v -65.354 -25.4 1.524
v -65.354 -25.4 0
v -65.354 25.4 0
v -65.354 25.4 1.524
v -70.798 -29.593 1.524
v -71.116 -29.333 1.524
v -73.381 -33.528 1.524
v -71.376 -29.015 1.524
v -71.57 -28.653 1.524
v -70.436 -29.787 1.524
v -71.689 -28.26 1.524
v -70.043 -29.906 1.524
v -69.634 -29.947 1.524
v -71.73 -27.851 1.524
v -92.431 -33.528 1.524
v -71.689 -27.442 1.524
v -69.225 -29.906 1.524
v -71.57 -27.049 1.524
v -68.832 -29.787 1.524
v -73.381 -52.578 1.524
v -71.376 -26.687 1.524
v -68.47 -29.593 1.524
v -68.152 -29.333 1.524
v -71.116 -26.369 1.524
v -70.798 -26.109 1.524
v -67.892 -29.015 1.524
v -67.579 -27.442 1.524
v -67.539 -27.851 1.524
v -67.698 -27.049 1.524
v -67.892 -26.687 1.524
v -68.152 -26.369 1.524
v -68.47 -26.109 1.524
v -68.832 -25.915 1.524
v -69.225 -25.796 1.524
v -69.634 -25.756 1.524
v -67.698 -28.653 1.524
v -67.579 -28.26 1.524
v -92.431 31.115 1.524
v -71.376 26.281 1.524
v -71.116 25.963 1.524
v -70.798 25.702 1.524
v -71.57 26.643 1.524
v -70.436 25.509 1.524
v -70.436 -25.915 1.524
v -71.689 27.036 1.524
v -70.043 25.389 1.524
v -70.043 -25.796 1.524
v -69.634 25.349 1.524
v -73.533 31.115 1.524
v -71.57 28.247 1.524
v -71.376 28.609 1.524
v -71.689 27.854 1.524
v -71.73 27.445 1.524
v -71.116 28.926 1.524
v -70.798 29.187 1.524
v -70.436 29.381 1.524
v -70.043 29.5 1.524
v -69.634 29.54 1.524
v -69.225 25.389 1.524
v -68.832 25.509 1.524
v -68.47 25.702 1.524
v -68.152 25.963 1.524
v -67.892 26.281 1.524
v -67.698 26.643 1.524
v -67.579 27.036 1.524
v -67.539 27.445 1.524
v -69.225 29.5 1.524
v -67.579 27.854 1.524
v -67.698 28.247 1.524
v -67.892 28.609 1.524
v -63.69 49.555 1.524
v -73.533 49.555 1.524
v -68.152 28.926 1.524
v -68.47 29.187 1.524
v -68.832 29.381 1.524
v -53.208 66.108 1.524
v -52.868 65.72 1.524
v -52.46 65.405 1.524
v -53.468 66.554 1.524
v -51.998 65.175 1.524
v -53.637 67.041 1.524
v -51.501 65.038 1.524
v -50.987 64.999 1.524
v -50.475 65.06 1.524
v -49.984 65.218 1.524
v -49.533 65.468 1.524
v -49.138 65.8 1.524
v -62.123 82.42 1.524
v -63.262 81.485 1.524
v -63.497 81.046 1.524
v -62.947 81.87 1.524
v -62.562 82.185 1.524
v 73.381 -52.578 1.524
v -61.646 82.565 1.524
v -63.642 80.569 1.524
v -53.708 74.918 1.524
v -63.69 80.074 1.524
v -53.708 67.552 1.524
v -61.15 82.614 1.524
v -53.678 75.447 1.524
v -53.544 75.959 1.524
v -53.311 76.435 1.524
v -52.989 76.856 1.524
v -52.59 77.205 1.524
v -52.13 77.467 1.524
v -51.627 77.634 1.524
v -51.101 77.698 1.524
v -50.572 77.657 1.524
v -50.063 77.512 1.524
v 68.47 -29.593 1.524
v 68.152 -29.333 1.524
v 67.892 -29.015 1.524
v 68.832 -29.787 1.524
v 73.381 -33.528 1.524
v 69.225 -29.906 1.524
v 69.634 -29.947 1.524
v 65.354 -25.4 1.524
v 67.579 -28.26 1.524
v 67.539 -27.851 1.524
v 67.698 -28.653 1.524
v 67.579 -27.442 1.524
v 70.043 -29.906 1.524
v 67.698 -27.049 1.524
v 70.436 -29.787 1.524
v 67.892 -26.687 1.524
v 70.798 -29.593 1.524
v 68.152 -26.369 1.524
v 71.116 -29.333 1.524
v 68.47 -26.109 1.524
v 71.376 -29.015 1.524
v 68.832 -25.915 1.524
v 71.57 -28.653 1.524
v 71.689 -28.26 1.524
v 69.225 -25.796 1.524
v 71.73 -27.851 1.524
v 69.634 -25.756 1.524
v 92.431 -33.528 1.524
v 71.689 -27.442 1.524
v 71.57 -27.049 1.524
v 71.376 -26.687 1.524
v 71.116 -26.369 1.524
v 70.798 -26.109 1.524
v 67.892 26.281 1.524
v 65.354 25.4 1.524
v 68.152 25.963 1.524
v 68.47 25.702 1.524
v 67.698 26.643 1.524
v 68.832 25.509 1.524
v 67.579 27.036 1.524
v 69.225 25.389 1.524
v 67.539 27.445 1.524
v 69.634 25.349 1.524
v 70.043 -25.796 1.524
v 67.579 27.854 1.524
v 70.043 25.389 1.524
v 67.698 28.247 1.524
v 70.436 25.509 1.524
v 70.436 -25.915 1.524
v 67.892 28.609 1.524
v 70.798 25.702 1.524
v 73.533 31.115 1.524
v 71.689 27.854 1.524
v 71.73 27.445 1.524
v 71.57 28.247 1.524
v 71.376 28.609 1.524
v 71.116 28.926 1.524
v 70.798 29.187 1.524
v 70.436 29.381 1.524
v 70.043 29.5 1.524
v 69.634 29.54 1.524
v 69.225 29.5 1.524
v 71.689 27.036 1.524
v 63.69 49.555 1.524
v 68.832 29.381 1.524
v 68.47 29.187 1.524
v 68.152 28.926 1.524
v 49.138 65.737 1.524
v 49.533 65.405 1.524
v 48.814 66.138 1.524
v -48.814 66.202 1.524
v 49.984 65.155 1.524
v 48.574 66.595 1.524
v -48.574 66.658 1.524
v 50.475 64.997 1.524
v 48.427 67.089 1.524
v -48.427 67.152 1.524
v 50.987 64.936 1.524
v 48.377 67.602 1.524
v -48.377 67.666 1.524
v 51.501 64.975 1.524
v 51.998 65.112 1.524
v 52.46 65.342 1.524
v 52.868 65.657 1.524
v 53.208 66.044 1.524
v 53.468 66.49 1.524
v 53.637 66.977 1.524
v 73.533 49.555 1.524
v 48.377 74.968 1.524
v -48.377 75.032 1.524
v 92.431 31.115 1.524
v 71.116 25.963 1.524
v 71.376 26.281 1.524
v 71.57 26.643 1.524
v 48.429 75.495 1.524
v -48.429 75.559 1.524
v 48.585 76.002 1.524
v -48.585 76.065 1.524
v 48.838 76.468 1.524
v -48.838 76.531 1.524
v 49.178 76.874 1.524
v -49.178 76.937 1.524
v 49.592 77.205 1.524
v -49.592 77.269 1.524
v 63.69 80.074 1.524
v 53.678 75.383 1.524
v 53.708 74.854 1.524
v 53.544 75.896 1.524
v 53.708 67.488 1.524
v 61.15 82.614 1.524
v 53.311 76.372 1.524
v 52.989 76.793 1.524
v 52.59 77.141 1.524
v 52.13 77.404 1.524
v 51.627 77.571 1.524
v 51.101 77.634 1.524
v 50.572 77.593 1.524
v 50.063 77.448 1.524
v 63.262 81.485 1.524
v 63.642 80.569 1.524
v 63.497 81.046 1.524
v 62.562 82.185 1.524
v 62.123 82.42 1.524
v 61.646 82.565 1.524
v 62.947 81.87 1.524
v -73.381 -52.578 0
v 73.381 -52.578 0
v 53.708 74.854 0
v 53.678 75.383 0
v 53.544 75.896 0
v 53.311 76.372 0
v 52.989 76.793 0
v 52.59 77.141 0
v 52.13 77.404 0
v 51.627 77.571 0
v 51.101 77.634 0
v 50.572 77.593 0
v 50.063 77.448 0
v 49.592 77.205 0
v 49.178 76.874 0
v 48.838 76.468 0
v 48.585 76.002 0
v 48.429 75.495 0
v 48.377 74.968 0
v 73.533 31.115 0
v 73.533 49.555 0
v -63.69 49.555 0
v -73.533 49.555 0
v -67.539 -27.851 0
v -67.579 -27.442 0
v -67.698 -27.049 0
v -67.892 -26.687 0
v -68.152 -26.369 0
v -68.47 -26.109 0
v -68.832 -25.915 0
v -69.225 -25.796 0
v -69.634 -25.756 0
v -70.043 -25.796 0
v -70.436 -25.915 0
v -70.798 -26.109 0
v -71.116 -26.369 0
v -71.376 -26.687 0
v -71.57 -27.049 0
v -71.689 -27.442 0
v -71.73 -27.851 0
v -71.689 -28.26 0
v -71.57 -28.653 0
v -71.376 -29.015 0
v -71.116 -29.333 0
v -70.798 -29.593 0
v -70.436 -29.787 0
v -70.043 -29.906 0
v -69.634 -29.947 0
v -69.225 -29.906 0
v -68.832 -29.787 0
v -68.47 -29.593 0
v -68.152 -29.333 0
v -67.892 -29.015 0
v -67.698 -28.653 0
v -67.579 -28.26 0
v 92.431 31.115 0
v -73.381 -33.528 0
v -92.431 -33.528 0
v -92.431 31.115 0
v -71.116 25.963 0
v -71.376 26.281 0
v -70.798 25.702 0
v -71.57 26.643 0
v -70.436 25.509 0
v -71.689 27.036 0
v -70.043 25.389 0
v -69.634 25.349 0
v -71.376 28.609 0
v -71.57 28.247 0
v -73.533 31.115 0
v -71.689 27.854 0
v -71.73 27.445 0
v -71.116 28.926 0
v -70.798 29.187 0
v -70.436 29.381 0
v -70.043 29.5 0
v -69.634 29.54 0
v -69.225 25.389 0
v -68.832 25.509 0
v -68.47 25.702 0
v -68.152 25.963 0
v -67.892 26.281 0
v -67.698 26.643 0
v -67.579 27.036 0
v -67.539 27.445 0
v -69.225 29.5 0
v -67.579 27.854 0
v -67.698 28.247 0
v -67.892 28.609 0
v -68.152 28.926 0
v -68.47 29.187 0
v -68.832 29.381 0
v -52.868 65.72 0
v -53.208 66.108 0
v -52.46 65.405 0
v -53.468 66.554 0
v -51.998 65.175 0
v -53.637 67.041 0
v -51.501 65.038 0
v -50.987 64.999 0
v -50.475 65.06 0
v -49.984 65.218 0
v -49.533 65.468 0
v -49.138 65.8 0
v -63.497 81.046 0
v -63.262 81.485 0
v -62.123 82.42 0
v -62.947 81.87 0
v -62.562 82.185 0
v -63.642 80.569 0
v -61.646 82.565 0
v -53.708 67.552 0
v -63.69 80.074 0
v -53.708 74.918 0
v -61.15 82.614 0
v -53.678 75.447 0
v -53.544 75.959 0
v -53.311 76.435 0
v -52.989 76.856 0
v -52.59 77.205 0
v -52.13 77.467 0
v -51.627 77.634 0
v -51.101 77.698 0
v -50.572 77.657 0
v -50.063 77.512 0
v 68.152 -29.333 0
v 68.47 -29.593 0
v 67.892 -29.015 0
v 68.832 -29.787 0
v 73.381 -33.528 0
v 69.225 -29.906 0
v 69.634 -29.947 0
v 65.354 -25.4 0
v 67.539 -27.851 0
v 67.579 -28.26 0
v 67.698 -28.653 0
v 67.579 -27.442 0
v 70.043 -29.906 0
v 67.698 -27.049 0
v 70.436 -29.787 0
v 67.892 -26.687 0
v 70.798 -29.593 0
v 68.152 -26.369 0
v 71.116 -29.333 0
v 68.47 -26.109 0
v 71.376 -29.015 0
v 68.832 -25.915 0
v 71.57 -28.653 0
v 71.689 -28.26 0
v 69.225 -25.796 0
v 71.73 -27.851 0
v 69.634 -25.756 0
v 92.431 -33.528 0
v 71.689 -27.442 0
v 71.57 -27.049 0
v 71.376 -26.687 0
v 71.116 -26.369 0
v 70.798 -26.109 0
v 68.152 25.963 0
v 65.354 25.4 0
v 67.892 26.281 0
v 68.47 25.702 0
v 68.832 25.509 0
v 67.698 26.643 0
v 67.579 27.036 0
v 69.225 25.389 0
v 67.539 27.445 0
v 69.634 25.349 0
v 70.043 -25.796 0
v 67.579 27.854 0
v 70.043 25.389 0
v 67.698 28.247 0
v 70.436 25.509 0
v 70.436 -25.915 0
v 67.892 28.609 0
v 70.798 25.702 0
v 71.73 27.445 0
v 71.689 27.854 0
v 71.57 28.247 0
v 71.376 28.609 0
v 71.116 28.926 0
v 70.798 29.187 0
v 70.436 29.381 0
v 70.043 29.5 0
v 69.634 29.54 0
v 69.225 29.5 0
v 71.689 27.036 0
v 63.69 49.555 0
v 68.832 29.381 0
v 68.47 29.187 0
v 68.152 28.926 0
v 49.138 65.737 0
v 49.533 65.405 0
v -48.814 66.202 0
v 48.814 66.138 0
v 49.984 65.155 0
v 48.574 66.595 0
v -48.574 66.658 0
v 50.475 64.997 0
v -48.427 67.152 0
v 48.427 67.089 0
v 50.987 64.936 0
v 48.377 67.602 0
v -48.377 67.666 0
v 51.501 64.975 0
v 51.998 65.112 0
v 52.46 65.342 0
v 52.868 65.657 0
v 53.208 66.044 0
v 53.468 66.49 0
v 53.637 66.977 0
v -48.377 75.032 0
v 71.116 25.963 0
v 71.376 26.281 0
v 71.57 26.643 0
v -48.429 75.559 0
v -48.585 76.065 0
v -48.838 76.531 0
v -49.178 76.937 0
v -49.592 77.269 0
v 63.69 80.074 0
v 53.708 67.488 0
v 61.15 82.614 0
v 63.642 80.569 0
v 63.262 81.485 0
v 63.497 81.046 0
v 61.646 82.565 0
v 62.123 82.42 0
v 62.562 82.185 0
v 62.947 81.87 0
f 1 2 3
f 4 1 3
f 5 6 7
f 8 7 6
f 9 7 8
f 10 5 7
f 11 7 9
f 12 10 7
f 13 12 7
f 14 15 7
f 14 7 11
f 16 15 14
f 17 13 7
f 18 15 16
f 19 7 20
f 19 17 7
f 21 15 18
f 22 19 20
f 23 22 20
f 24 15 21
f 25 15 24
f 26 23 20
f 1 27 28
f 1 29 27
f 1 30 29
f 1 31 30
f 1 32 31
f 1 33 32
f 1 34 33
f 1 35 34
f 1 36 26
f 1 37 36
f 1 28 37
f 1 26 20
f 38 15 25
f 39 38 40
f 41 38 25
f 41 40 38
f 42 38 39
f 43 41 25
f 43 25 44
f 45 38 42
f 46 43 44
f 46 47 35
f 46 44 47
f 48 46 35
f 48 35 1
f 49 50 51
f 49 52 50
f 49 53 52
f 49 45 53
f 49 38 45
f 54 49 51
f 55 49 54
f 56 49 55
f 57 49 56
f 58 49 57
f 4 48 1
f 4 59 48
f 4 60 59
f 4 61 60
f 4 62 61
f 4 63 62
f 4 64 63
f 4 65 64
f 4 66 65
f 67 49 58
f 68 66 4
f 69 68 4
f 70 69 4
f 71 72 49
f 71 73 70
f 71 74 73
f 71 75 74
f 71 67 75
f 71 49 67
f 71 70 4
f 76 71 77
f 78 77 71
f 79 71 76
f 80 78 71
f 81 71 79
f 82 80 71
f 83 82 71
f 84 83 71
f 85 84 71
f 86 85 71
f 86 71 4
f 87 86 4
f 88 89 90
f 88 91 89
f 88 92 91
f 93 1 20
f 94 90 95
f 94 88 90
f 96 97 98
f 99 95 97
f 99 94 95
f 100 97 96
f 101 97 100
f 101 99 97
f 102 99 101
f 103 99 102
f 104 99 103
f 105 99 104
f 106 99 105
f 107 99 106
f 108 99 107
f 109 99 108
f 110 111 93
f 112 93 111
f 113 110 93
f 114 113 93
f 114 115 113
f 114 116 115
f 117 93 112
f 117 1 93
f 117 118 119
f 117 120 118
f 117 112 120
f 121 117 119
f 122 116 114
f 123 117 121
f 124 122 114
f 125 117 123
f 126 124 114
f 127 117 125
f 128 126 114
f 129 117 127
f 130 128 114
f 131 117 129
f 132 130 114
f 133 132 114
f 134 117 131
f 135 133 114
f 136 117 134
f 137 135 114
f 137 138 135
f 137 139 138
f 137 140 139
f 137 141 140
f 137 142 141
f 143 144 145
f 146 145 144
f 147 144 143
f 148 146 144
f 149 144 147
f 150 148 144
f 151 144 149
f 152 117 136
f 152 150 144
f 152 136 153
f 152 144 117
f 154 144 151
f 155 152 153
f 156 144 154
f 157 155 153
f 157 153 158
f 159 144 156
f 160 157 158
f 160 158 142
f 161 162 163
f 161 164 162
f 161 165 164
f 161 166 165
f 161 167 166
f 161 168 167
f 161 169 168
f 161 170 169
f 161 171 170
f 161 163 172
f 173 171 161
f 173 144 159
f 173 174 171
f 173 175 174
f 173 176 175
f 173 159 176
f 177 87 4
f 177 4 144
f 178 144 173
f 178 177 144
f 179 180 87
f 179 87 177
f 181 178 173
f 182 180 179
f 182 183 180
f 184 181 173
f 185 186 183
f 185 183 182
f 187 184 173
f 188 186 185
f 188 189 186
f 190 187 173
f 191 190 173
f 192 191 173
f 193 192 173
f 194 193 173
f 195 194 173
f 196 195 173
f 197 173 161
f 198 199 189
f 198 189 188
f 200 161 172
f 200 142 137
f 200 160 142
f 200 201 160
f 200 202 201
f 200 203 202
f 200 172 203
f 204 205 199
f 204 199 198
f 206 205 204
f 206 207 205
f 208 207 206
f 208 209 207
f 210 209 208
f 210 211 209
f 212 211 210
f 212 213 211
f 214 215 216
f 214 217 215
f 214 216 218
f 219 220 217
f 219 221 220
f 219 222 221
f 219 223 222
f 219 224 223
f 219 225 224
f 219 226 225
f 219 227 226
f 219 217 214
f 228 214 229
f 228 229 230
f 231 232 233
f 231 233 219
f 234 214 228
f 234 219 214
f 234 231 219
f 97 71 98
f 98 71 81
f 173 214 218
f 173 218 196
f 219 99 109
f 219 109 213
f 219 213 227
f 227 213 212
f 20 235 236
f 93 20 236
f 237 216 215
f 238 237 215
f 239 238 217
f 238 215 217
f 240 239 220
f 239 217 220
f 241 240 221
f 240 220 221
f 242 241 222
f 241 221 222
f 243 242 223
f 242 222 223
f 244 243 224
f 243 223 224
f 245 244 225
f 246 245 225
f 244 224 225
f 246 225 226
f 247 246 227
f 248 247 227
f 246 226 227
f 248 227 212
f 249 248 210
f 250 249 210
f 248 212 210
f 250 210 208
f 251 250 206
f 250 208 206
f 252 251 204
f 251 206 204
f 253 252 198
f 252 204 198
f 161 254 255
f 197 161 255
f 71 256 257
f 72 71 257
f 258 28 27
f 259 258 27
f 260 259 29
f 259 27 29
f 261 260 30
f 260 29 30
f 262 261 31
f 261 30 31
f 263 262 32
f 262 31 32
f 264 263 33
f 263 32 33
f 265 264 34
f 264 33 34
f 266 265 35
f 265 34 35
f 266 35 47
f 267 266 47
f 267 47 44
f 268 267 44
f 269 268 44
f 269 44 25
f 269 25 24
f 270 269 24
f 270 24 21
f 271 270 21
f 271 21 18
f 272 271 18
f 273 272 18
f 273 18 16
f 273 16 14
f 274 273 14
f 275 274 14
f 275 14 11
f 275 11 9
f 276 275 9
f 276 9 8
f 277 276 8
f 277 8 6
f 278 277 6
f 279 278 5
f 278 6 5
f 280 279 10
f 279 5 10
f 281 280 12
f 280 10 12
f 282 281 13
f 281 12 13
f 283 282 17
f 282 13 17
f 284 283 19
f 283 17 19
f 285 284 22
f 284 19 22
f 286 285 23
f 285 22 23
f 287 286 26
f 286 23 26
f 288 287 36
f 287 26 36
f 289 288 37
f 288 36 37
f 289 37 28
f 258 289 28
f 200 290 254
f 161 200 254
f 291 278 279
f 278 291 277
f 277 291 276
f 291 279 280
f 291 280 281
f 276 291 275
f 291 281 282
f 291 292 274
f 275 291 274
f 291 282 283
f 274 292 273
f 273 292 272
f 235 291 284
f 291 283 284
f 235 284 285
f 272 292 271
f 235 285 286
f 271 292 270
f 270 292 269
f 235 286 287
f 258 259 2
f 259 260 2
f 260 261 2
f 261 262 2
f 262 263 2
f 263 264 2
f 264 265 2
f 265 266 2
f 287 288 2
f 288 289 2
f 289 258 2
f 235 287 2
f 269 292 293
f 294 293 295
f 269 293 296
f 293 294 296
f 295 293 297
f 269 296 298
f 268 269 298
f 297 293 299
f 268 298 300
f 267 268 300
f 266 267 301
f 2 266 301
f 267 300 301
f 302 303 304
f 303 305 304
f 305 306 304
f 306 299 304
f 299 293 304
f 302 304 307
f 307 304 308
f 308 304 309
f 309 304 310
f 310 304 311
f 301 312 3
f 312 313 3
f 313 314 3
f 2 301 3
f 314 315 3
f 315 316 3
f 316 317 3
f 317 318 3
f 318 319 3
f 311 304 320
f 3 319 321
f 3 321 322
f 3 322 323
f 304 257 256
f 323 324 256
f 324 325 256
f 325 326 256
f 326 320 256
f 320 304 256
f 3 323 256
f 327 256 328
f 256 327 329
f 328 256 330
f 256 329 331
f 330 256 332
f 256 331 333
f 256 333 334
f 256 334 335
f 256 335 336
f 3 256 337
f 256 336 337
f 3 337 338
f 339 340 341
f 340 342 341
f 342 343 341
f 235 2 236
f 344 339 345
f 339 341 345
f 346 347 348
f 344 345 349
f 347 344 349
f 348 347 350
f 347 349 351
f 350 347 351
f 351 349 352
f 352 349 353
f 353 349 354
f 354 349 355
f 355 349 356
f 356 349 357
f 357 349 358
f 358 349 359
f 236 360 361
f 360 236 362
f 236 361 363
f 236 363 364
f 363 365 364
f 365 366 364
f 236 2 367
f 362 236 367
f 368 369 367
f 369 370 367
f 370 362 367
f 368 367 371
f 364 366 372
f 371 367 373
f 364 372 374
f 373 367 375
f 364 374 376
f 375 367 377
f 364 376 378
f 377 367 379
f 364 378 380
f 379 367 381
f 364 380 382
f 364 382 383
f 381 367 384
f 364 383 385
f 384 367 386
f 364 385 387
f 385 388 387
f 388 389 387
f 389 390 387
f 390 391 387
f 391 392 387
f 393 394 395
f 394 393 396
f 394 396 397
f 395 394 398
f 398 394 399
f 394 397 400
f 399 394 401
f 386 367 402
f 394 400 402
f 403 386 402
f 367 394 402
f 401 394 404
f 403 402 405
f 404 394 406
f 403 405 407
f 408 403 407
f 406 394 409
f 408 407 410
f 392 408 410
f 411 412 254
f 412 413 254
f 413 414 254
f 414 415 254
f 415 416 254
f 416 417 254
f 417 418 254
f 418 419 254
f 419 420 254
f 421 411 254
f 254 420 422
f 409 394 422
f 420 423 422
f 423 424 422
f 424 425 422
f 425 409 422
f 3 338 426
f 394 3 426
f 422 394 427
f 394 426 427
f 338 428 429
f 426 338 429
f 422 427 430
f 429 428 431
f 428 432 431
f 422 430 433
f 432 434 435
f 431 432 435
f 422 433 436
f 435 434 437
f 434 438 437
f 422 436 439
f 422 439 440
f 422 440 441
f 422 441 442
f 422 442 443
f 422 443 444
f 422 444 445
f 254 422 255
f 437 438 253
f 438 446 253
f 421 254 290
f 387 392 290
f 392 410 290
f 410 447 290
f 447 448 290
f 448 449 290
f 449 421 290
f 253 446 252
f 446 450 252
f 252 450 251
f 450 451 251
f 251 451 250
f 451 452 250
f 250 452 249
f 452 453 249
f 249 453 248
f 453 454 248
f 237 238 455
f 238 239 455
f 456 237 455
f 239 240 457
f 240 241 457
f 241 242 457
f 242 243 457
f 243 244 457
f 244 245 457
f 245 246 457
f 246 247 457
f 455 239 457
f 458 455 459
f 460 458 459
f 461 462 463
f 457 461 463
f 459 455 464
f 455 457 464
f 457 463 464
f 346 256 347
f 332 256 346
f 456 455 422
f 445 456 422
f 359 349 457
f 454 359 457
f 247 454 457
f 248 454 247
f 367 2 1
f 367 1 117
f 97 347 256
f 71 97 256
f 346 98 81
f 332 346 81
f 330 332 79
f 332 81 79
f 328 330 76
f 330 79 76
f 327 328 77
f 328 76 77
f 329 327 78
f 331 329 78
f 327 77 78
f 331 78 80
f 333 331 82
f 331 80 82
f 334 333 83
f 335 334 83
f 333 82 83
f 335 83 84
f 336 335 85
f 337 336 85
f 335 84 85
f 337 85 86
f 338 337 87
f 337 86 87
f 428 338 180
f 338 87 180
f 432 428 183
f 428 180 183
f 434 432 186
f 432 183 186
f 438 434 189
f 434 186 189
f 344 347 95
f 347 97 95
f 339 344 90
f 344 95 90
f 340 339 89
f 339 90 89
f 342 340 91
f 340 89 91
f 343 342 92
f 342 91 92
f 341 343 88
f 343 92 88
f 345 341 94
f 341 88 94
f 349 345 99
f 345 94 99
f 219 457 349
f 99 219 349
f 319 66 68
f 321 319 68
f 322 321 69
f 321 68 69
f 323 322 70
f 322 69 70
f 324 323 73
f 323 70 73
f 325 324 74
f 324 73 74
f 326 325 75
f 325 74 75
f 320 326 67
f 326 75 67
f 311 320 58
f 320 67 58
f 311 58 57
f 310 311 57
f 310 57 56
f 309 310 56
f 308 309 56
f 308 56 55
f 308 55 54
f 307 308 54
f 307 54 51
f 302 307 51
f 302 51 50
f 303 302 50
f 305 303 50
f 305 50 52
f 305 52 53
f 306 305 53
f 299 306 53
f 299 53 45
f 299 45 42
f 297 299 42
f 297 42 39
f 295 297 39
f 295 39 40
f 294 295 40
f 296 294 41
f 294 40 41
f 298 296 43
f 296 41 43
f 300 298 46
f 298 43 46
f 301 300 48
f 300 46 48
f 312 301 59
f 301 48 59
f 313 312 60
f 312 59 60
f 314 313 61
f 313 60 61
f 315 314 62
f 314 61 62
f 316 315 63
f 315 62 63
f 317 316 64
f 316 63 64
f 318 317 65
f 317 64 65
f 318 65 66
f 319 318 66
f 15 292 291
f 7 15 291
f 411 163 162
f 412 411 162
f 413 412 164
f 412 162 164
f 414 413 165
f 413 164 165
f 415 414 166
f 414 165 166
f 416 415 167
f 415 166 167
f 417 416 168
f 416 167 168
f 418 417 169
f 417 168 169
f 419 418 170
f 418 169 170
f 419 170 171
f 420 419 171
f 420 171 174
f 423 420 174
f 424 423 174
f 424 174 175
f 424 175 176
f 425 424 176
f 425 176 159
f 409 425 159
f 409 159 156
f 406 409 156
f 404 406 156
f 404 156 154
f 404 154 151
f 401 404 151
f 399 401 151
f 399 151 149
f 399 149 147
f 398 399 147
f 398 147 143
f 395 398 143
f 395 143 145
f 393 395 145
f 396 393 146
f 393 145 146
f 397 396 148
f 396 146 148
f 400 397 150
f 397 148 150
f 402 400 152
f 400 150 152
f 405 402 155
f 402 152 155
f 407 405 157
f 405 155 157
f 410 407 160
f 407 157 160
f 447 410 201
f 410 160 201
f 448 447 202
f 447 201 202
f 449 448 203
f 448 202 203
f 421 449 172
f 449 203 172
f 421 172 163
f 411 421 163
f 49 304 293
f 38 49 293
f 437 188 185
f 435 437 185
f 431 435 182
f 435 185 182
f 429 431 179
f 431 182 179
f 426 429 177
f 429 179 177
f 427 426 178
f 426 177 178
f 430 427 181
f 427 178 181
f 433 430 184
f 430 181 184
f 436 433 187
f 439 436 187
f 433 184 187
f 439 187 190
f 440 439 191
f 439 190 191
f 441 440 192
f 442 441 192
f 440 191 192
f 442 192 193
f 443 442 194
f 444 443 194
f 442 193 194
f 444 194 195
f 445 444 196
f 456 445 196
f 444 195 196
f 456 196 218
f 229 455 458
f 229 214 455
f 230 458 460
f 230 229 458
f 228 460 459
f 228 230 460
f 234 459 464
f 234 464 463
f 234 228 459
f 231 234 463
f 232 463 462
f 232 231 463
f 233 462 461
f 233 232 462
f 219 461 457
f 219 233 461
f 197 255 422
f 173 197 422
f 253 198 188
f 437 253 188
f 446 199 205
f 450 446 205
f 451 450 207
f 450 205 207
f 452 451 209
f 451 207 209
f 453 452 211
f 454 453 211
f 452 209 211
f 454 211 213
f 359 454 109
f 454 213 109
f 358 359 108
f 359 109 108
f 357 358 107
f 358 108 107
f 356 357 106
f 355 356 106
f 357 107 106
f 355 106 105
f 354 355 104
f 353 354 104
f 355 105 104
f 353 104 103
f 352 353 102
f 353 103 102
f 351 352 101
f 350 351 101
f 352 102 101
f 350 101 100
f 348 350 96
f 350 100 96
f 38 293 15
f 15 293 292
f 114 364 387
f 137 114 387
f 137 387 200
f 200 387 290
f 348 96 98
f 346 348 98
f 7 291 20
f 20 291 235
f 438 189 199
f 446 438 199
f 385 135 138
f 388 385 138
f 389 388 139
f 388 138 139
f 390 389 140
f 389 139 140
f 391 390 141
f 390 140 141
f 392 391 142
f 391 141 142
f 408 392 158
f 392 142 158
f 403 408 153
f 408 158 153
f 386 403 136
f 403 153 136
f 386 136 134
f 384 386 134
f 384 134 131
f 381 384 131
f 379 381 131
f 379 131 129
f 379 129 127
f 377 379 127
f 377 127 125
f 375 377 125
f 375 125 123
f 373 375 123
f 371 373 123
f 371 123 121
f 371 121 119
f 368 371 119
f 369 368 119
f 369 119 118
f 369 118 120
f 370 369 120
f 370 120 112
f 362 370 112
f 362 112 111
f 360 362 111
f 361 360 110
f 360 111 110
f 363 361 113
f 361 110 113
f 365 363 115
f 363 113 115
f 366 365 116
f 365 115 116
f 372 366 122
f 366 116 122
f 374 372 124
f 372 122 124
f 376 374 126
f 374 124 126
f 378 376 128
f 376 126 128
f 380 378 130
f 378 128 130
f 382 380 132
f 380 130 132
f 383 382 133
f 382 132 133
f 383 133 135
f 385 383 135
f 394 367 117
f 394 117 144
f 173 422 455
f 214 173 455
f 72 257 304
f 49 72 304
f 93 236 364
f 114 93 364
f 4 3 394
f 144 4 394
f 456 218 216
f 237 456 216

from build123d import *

# Parameters (mm, degrees)
F0_W     = 130.7084
F0_H     = 50.8
F1_DEPTH = 1.524
F2_R     = 2.0955
F3_DEPTH = 25.4
F4_R     = 2.54
F6_DEPTH = 25.4


with BuildPart() as f1:
    # F0 (on Top) → F1 (new body)
    with BuildSketch(Plane.XY):
        Polygon((-73.3806, -52.578), (73.3806, -52.578), (73.3806, -33.528), (92.4306, -33.528), (92.4306, 31.115), (73.533, 31.115), (73.533, 49.5554), (63.6905, 49.5554), (63.6905, 82.6135), (-63.6905, 82.6135), (-63.6905, 49.5554), (-73.533, 49.5554), (-73.533, 31.115), (-92.4306, 31.115), (-92.4306, -33.528), (-73.3806, -33.528), align=None)
        Rectangle(F0_W, F0_H, mode=Mode.SUBTRACT)
    extrude(amount=F1_DEPTH)

    # F2 (on face) → F3 (cut)
    with BuildSketch(Plane.XY.offset(1.524)):
        with Locations((69.6341, -27.8511)):
            Circle(F2_R)
        with Locations((69.6341, 27.4447)):
            Circle(F2_R)
        with Locations((-69.6341, 27.4447)):
            Circle(F2_R)
        with Locations((-69.6341, -27.8511)):
            Circle(F2_R)
    extrude(amount=-F3_DEPTH, mode=Mode.SUBTRACT)

    # F4
    f4_edges = [f1.edges().sort_by_distance(p)[0] for p in [
        (63.6905, 82.6135, 0.762),
        (-63.6905, 82.6135, 0.762),
    ]]
    fillet(f4_edges, radius=F4_R)

    # F5 (on face) → F6 (cut)
    with BuildSketch(Plane.XY.offset(1.524)):
        with BuildLine():
            Line((53.7083, 67.488136), (53.7083, 74.854136))
            ThreePointArc((53.7083, 74.854136), (51.100731, 77.634491), (48.376736, 74.9681))
            Line((48.376736, 74.9681), (48.376736, 67.6021))
            ThreePointArc((48.376736, 67.6021), (50.986741, 64.935709), (53.7083, 67.488136))
        make_face()
        with BuildLine():
            ThreePointArc((-53.7083, 67.551636), (-50.986741, 64.999209), (-48.376736, 67.6656))
            Line((-48.376736, 67.6656), (-48.376736, 75.0316))
            ThreePointArc((-48.376736, 75.0316), (-51.100731, 77.697991), (-53.7083, 74.917636))
            Line((-53.7083, 74.917636), (-53.7083, 67.551636))
        make_face()
    extrude(amount=-F6_DEPTH, mode=Mode.SUBTRACT)


solid = f1.part
